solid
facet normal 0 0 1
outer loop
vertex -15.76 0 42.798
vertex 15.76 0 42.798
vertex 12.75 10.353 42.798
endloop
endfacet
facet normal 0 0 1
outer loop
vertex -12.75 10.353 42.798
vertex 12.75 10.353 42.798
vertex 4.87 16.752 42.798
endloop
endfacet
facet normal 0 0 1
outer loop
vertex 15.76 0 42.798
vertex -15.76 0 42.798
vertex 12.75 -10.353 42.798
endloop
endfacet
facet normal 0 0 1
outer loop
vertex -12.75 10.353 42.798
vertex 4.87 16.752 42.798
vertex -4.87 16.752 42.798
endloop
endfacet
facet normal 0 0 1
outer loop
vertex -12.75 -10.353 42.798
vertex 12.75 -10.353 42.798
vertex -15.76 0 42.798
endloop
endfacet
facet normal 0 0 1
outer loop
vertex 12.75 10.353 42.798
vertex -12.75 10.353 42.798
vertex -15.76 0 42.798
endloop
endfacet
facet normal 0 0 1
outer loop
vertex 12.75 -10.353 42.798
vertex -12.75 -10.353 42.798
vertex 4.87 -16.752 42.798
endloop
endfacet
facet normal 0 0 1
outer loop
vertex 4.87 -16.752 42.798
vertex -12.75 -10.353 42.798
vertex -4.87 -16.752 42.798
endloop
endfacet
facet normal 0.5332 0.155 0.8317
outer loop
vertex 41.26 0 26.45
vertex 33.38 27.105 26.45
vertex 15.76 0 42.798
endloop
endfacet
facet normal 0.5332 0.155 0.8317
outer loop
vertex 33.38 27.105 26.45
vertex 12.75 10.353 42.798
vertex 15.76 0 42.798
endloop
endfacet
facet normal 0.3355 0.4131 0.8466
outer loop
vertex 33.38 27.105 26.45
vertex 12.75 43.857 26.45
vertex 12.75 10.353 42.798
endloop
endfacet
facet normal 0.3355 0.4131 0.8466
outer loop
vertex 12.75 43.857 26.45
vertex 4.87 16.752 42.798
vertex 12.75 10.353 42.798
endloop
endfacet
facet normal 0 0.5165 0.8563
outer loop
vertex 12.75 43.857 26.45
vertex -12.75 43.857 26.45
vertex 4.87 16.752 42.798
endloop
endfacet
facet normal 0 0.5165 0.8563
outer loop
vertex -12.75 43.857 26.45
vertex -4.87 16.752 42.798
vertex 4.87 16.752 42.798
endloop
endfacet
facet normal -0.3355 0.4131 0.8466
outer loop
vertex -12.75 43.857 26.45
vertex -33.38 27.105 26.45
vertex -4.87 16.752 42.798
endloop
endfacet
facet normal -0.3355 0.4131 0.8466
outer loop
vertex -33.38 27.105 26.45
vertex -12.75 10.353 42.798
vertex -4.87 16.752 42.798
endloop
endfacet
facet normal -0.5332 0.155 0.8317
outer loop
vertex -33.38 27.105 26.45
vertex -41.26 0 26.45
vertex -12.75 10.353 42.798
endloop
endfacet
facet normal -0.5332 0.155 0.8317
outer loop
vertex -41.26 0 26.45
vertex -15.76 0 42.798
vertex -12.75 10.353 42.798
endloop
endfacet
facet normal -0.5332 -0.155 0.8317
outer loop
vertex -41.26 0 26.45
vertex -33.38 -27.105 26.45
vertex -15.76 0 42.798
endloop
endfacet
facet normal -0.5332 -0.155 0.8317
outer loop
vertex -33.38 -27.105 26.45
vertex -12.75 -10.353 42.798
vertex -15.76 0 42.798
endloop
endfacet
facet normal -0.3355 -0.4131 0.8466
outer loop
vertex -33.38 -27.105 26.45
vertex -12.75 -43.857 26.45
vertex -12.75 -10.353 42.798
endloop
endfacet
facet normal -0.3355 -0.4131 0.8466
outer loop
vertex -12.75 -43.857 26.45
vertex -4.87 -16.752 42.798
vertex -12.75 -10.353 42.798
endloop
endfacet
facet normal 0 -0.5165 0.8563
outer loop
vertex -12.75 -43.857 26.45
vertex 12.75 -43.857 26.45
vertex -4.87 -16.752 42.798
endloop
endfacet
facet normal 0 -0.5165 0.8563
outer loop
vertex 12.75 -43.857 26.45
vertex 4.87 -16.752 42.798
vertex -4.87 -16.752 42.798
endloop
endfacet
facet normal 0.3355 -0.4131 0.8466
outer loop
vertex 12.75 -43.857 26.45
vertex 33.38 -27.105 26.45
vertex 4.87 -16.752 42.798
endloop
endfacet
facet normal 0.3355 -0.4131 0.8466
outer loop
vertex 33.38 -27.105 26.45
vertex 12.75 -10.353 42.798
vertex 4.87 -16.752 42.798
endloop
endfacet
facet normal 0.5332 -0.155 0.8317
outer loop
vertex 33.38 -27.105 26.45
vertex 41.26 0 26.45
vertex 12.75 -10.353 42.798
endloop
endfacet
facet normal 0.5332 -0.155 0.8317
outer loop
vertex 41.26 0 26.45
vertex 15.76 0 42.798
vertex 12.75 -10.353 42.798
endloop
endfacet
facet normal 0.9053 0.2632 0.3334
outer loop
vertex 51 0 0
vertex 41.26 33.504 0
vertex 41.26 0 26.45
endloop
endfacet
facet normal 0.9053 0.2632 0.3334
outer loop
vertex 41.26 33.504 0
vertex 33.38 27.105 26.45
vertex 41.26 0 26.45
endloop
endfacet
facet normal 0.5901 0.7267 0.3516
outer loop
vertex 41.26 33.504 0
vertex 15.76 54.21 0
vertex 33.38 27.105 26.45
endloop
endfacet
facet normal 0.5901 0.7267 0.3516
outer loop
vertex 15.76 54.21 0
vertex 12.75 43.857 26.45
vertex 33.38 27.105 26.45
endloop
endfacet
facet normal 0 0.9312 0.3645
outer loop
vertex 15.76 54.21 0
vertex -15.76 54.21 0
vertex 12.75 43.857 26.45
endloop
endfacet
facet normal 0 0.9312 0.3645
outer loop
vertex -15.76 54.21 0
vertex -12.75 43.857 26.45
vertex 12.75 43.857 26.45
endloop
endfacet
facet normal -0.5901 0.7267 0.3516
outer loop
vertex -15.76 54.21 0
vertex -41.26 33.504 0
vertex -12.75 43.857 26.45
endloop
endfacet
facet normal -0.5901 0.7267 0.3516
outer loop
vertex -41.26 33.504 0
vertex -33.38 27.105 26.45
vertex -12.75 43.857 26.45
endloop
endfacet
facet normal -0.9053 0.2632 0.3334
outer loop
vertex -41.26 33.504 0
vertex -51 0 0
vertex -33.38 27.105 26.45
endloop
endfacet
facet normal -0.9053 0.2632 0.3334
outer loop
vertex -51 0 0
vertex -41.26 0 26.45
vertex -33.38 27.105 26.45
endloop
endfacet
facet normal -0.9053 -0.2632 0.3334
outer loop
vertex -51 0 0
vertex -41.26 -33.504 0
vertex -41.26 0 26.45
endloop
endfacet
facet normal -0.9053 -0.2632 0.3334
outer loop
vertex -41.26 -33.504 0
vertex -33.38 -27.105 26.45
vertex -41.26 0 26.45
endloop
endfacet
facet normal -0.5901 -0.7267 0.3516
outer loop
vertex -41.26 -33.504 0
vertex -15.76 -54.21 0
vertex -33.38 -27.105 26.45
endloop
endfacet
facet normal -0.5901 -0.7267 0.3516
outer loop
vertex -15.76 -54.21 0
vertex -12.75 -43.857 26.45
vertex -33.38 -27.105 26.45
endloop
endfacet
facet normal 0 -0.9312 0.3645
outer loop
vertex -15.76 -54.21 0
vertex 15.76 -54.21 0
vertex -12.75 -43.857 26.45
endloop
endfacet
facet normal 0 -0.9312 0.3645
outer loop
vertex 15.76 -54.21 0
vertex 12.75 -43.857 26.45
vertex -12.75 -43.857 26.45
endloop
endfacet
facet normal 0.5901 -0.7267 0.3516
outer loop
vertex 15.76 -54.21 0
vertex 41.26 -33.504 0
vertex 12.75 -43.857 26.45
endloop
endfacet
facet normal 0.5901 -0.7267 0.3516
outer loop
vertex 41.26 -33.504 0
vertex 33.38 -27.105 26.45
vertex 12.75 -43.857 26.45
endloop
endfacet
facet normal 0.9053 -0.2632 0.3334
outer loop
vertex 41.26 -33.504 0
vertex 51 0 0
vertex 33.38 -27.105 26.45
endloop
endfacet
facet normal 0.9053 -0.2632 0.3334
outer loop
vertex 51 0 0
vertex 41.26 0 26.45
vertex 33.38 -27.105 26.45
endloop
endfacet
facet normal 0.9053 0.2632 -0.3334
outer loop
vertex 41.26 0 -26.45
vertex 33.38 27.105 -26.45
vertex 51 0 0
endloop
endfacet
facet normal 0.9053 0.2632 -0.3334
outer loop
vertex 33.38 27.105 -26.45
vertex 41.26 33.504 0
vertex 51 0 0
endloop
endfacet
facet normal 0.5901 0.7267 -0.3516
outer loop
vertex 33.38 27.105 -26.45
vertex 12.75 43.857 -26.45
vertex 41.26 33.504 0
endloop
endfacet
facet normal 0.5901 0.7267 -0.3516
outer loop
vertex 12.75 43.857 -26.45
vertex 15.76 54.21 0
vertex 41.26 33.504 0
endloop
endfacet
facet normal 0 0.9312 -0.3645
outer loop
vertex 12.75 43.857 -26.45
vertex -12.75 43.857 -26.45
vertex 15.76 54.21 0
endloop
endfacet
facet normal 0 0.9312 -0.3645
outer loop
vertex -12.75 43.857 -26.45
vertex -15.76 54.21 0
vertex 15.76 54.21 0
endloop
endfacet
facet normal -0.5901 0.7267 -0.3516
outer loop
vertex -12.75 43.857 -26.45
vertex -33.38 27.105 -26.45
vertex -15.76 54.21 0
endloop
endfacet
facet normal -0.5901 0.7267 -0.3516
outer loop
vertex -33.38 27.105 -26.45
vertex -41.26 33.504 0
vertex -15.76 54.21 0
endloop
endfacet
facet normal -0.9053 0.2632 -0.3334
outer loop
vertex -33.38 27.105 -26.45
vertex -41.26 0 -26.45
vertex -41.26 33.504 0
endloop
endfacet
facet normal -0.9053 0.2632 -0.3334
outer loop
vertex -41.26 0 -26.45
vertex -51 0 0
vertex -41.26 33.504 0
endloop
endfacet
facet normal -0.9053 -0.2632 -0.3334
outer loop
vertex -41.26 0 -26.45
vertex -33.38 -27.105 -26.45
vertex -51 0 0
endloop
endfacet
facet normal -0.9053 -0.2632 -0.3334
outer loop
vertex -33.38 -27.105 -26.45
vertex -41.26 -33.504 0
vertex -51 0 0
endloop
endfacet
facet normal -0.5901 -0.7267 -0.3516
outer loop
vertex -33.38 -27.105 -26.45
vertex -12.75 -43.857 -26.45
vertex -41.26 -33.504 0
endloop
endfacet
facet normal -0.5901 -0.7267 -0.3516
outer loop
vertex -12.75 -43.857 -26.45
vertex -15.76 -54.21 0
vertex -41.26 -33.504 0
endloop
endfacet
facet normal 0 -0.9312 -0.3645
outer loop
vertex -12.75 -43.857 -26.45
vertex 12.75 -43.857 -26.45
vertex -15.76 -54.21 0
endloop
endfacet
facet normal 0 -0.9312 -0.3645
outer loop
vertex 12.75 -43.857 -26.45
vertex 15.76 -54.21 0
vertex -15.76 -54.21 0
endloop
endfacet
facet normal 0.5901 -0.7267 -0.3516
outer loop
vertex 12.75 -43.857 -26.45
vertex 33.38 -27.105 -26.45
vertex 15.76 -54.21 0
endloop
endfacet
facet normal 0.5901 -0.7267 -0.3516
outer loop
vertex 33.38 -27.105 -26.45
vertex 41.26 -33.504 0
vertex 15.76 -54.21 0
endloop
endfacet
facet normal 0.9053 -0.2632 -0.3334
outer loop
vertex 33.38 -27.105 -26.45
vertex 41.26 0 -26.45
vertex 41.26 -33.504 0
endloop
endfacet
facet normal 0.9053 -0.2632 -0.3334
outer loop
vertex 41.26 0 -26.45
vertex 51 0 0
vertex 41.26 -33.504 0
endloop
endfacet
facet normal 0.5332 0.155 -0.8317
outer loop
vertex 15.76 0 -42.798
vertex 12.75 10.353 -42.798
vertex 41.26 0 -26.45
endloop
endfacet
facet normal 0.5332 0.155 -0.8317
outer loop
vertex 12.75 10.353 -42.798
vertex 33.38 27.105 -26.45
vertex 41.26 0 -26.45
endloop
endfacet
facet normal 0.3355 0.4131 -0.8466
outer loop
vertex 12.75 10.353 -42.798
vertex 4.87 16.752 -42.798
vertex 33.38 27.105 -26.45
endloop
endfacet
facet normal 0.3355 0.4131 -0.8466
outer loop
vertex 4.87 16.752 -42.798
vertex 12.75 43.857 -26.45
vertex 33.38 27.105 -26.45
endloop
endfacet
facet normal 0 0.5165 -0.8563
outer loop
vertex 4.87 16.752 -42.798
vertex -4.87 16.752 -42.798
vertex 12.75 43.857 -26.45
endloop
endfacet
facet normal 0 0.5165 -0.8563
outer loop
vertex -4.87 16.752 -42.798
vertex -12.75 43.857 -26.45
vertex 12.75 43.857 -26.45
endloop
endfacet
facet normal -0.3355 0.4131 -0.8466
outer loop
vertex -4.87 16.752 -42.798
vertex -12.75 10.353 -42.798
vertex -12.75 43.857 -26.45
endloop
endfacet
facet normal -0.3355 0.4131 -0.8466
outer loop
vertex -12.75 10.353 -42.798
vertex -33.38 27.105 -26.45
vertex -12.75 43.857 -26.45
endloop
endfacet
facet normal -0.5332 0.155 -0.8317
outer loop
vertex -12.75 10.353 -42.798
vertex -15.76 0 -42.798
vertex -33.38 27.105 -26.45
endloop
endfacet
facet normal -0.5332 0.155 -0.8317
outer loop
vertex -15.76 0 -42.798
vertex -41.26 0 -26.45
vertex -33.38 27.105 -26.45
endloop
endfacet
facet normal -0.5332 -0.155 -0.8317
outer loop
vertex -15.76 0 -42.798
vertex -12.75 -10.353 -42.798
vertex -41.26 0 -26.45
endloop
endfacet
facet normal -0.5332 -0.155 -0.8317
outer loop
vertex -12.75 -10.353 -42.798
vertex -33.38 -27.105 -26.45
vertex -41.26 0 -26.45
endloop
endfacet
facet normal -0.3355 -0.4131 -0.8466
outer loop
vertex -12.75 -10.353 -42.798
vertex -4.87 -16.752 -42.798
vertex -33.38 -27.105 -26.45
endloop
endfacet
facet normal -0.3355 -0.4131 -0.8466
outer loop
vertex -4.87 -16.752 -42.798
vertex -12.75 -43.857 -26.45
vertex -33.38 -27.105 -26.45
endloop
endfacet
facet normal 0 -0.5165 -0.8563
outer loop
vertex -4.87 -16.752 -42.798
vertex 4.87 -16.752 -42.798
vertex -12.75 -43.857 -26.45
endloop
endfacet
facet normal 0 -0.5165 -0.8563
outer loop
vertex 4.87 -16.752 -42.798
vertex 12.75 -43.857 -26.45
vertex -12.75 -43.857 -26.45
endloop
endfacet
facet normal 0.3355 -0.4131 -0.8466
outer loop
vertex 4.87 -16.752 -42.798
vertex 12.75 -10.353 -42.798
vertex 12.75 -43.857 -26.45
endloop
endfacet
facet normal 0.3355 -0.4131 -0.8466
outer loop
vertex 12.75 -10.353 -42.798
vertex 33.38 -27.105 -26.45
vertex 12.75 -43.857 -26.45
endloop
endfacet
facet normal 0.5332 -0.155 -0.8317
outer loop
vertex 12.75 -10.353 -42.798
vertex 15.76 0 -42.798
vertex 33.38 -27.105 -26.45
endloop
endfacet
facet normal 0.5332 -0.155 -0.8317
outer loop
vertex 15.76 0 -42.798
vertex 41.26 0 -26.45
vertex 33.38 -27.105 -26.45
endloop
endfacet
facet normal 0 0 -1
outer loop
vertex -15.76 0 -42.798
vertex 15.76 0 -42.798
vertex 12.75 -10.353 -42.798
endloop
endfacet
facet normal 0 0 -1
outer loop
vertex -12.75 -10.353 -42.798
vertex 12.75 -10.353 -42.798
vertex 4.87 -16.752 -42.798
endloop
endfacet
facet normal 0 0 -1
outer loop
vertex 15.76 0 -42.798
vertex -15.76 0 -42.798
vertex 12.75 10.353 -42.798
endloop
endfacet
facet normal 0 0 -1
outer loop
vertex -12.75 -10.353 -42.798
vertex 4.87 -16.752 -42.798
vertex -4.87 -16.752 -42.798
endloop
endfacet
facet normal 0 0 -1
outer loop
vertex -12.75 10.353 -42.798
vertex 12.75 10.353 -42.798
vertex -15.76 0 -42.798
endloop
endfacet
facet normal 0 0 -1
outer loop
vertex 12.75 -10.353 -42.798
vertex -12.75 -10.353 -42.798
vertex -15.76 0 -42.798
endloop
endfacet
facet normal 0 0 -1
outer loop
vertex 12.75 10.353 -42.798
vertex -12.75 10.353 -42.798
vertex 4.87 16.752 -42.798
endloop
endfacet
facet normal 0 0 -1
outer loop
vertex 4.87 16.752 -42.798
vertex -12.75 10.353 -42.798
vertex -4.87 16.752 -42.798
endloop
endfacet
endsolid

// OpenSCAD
// Generated by SolidPython 1.0.1 on 2020-07-29 00:46:53


scale(v = [17, 19, 15]) {
	sphere(r = 3);
}
/***********************************************
*********      SolidPython code:      **********
************************************************
 
# import packages: SolidPython
from solid import *
from solid.utils import *
from itertools import chain, combinations, permutations


class Resize:

    def __init__(self, scad_file):
        self.scad_file = scad_file
        #self.scad_file = import_scad(scad_file)
        # cone/cylinder param:
        self.r1 = 0
        self.r2 = 0
        self.h = 0
        # rectangular prism param:
        self.w = 0
        self.l = 0
        # ellipse param:
        self.r = 0

    # import OpenScad code (file name corresponds to shape)


    # classify shape + parameters
    def assign(self, param1, param2, param3):
        if self.scad_file == 'cone.scad':
            self.r1 = param1
            self.r2 = param2
            self.h = param3
        elif self.scad_file == 'cylinder.scad':
            self.r1 = param1
            self.r2 = param2
            self.h = param3
        elif self.scad_file == 'rectangularPrism.scad':
            self.h = param1
            self.l = param2
            self.w = param3
        else:
            self.r = param1
            self.h = param2

    # resize parameters
    def iterate(self):
        x = range(3, 20, 2)
        i = 1
        if self.scad_file == 'cone.scad':
            tempList = list(permutations(x, 2))
            for temp in tempList:
                param1 = temp[0]
                param2 = temp[1]
                filepath = 'produced_scad_files/' + 'cone' + str(param1) + '_' + str(param2) + '_' + '.scad'
                scad_render_to_file(cylinder(h=param1, r1=param2, r2=0), filepath)

        elif self.scad_file == 'cylinder.scad':
            tempList = list(permutations(x, 3))
            for temp in tempList:
                param1 = temp[0]
                param2 = temp[1]
                filepath = 'produced_scad_files/' + 'cylinder' + str(param1) + '_' + str(param2) + '_' + '.scad'
                scad_render_to_file(cylinder(h=param1, r1=param2, r2=param2), filepath)

        elif self.scad_file == 'rectangularPrism.scad':
            tempList = list(permutations(x, 3))
            for temp in tempList:
                param1 = temp[0]
                param2 = temp[1]
                param3 = temp[2]
                filepath = 'produced_scad_files/' + 'rectangularPrism' + str(param1) + '_' + str(param2) + '_' + str(
                    param3) + '.scad'
                scad_render_to_file(cube(size=(param1, param2, param3)), filepath)

        elif self.scad_file == 'ellipse.scad':
            tempList = list(permutations(x, 4))
            for temp in tempList:
                param1 = temp[0]
                param2 = temp[1]
                param3 = temp[2]
                param4 = temp[3]
                filepath = 'produced_scad_files/' + 'ellipse' + str(param1) + '_' + str(param2) + '_' + str(param3) + '_' + str(param4) + '.scad'
                scad_render_to_file(scale([param1, param2, param3])(sphere(r=param4)), filepath)

    def render_to_scadfile(self):
        scad_render_to_file(scad, 'example.scad') 
 
************************************************/
